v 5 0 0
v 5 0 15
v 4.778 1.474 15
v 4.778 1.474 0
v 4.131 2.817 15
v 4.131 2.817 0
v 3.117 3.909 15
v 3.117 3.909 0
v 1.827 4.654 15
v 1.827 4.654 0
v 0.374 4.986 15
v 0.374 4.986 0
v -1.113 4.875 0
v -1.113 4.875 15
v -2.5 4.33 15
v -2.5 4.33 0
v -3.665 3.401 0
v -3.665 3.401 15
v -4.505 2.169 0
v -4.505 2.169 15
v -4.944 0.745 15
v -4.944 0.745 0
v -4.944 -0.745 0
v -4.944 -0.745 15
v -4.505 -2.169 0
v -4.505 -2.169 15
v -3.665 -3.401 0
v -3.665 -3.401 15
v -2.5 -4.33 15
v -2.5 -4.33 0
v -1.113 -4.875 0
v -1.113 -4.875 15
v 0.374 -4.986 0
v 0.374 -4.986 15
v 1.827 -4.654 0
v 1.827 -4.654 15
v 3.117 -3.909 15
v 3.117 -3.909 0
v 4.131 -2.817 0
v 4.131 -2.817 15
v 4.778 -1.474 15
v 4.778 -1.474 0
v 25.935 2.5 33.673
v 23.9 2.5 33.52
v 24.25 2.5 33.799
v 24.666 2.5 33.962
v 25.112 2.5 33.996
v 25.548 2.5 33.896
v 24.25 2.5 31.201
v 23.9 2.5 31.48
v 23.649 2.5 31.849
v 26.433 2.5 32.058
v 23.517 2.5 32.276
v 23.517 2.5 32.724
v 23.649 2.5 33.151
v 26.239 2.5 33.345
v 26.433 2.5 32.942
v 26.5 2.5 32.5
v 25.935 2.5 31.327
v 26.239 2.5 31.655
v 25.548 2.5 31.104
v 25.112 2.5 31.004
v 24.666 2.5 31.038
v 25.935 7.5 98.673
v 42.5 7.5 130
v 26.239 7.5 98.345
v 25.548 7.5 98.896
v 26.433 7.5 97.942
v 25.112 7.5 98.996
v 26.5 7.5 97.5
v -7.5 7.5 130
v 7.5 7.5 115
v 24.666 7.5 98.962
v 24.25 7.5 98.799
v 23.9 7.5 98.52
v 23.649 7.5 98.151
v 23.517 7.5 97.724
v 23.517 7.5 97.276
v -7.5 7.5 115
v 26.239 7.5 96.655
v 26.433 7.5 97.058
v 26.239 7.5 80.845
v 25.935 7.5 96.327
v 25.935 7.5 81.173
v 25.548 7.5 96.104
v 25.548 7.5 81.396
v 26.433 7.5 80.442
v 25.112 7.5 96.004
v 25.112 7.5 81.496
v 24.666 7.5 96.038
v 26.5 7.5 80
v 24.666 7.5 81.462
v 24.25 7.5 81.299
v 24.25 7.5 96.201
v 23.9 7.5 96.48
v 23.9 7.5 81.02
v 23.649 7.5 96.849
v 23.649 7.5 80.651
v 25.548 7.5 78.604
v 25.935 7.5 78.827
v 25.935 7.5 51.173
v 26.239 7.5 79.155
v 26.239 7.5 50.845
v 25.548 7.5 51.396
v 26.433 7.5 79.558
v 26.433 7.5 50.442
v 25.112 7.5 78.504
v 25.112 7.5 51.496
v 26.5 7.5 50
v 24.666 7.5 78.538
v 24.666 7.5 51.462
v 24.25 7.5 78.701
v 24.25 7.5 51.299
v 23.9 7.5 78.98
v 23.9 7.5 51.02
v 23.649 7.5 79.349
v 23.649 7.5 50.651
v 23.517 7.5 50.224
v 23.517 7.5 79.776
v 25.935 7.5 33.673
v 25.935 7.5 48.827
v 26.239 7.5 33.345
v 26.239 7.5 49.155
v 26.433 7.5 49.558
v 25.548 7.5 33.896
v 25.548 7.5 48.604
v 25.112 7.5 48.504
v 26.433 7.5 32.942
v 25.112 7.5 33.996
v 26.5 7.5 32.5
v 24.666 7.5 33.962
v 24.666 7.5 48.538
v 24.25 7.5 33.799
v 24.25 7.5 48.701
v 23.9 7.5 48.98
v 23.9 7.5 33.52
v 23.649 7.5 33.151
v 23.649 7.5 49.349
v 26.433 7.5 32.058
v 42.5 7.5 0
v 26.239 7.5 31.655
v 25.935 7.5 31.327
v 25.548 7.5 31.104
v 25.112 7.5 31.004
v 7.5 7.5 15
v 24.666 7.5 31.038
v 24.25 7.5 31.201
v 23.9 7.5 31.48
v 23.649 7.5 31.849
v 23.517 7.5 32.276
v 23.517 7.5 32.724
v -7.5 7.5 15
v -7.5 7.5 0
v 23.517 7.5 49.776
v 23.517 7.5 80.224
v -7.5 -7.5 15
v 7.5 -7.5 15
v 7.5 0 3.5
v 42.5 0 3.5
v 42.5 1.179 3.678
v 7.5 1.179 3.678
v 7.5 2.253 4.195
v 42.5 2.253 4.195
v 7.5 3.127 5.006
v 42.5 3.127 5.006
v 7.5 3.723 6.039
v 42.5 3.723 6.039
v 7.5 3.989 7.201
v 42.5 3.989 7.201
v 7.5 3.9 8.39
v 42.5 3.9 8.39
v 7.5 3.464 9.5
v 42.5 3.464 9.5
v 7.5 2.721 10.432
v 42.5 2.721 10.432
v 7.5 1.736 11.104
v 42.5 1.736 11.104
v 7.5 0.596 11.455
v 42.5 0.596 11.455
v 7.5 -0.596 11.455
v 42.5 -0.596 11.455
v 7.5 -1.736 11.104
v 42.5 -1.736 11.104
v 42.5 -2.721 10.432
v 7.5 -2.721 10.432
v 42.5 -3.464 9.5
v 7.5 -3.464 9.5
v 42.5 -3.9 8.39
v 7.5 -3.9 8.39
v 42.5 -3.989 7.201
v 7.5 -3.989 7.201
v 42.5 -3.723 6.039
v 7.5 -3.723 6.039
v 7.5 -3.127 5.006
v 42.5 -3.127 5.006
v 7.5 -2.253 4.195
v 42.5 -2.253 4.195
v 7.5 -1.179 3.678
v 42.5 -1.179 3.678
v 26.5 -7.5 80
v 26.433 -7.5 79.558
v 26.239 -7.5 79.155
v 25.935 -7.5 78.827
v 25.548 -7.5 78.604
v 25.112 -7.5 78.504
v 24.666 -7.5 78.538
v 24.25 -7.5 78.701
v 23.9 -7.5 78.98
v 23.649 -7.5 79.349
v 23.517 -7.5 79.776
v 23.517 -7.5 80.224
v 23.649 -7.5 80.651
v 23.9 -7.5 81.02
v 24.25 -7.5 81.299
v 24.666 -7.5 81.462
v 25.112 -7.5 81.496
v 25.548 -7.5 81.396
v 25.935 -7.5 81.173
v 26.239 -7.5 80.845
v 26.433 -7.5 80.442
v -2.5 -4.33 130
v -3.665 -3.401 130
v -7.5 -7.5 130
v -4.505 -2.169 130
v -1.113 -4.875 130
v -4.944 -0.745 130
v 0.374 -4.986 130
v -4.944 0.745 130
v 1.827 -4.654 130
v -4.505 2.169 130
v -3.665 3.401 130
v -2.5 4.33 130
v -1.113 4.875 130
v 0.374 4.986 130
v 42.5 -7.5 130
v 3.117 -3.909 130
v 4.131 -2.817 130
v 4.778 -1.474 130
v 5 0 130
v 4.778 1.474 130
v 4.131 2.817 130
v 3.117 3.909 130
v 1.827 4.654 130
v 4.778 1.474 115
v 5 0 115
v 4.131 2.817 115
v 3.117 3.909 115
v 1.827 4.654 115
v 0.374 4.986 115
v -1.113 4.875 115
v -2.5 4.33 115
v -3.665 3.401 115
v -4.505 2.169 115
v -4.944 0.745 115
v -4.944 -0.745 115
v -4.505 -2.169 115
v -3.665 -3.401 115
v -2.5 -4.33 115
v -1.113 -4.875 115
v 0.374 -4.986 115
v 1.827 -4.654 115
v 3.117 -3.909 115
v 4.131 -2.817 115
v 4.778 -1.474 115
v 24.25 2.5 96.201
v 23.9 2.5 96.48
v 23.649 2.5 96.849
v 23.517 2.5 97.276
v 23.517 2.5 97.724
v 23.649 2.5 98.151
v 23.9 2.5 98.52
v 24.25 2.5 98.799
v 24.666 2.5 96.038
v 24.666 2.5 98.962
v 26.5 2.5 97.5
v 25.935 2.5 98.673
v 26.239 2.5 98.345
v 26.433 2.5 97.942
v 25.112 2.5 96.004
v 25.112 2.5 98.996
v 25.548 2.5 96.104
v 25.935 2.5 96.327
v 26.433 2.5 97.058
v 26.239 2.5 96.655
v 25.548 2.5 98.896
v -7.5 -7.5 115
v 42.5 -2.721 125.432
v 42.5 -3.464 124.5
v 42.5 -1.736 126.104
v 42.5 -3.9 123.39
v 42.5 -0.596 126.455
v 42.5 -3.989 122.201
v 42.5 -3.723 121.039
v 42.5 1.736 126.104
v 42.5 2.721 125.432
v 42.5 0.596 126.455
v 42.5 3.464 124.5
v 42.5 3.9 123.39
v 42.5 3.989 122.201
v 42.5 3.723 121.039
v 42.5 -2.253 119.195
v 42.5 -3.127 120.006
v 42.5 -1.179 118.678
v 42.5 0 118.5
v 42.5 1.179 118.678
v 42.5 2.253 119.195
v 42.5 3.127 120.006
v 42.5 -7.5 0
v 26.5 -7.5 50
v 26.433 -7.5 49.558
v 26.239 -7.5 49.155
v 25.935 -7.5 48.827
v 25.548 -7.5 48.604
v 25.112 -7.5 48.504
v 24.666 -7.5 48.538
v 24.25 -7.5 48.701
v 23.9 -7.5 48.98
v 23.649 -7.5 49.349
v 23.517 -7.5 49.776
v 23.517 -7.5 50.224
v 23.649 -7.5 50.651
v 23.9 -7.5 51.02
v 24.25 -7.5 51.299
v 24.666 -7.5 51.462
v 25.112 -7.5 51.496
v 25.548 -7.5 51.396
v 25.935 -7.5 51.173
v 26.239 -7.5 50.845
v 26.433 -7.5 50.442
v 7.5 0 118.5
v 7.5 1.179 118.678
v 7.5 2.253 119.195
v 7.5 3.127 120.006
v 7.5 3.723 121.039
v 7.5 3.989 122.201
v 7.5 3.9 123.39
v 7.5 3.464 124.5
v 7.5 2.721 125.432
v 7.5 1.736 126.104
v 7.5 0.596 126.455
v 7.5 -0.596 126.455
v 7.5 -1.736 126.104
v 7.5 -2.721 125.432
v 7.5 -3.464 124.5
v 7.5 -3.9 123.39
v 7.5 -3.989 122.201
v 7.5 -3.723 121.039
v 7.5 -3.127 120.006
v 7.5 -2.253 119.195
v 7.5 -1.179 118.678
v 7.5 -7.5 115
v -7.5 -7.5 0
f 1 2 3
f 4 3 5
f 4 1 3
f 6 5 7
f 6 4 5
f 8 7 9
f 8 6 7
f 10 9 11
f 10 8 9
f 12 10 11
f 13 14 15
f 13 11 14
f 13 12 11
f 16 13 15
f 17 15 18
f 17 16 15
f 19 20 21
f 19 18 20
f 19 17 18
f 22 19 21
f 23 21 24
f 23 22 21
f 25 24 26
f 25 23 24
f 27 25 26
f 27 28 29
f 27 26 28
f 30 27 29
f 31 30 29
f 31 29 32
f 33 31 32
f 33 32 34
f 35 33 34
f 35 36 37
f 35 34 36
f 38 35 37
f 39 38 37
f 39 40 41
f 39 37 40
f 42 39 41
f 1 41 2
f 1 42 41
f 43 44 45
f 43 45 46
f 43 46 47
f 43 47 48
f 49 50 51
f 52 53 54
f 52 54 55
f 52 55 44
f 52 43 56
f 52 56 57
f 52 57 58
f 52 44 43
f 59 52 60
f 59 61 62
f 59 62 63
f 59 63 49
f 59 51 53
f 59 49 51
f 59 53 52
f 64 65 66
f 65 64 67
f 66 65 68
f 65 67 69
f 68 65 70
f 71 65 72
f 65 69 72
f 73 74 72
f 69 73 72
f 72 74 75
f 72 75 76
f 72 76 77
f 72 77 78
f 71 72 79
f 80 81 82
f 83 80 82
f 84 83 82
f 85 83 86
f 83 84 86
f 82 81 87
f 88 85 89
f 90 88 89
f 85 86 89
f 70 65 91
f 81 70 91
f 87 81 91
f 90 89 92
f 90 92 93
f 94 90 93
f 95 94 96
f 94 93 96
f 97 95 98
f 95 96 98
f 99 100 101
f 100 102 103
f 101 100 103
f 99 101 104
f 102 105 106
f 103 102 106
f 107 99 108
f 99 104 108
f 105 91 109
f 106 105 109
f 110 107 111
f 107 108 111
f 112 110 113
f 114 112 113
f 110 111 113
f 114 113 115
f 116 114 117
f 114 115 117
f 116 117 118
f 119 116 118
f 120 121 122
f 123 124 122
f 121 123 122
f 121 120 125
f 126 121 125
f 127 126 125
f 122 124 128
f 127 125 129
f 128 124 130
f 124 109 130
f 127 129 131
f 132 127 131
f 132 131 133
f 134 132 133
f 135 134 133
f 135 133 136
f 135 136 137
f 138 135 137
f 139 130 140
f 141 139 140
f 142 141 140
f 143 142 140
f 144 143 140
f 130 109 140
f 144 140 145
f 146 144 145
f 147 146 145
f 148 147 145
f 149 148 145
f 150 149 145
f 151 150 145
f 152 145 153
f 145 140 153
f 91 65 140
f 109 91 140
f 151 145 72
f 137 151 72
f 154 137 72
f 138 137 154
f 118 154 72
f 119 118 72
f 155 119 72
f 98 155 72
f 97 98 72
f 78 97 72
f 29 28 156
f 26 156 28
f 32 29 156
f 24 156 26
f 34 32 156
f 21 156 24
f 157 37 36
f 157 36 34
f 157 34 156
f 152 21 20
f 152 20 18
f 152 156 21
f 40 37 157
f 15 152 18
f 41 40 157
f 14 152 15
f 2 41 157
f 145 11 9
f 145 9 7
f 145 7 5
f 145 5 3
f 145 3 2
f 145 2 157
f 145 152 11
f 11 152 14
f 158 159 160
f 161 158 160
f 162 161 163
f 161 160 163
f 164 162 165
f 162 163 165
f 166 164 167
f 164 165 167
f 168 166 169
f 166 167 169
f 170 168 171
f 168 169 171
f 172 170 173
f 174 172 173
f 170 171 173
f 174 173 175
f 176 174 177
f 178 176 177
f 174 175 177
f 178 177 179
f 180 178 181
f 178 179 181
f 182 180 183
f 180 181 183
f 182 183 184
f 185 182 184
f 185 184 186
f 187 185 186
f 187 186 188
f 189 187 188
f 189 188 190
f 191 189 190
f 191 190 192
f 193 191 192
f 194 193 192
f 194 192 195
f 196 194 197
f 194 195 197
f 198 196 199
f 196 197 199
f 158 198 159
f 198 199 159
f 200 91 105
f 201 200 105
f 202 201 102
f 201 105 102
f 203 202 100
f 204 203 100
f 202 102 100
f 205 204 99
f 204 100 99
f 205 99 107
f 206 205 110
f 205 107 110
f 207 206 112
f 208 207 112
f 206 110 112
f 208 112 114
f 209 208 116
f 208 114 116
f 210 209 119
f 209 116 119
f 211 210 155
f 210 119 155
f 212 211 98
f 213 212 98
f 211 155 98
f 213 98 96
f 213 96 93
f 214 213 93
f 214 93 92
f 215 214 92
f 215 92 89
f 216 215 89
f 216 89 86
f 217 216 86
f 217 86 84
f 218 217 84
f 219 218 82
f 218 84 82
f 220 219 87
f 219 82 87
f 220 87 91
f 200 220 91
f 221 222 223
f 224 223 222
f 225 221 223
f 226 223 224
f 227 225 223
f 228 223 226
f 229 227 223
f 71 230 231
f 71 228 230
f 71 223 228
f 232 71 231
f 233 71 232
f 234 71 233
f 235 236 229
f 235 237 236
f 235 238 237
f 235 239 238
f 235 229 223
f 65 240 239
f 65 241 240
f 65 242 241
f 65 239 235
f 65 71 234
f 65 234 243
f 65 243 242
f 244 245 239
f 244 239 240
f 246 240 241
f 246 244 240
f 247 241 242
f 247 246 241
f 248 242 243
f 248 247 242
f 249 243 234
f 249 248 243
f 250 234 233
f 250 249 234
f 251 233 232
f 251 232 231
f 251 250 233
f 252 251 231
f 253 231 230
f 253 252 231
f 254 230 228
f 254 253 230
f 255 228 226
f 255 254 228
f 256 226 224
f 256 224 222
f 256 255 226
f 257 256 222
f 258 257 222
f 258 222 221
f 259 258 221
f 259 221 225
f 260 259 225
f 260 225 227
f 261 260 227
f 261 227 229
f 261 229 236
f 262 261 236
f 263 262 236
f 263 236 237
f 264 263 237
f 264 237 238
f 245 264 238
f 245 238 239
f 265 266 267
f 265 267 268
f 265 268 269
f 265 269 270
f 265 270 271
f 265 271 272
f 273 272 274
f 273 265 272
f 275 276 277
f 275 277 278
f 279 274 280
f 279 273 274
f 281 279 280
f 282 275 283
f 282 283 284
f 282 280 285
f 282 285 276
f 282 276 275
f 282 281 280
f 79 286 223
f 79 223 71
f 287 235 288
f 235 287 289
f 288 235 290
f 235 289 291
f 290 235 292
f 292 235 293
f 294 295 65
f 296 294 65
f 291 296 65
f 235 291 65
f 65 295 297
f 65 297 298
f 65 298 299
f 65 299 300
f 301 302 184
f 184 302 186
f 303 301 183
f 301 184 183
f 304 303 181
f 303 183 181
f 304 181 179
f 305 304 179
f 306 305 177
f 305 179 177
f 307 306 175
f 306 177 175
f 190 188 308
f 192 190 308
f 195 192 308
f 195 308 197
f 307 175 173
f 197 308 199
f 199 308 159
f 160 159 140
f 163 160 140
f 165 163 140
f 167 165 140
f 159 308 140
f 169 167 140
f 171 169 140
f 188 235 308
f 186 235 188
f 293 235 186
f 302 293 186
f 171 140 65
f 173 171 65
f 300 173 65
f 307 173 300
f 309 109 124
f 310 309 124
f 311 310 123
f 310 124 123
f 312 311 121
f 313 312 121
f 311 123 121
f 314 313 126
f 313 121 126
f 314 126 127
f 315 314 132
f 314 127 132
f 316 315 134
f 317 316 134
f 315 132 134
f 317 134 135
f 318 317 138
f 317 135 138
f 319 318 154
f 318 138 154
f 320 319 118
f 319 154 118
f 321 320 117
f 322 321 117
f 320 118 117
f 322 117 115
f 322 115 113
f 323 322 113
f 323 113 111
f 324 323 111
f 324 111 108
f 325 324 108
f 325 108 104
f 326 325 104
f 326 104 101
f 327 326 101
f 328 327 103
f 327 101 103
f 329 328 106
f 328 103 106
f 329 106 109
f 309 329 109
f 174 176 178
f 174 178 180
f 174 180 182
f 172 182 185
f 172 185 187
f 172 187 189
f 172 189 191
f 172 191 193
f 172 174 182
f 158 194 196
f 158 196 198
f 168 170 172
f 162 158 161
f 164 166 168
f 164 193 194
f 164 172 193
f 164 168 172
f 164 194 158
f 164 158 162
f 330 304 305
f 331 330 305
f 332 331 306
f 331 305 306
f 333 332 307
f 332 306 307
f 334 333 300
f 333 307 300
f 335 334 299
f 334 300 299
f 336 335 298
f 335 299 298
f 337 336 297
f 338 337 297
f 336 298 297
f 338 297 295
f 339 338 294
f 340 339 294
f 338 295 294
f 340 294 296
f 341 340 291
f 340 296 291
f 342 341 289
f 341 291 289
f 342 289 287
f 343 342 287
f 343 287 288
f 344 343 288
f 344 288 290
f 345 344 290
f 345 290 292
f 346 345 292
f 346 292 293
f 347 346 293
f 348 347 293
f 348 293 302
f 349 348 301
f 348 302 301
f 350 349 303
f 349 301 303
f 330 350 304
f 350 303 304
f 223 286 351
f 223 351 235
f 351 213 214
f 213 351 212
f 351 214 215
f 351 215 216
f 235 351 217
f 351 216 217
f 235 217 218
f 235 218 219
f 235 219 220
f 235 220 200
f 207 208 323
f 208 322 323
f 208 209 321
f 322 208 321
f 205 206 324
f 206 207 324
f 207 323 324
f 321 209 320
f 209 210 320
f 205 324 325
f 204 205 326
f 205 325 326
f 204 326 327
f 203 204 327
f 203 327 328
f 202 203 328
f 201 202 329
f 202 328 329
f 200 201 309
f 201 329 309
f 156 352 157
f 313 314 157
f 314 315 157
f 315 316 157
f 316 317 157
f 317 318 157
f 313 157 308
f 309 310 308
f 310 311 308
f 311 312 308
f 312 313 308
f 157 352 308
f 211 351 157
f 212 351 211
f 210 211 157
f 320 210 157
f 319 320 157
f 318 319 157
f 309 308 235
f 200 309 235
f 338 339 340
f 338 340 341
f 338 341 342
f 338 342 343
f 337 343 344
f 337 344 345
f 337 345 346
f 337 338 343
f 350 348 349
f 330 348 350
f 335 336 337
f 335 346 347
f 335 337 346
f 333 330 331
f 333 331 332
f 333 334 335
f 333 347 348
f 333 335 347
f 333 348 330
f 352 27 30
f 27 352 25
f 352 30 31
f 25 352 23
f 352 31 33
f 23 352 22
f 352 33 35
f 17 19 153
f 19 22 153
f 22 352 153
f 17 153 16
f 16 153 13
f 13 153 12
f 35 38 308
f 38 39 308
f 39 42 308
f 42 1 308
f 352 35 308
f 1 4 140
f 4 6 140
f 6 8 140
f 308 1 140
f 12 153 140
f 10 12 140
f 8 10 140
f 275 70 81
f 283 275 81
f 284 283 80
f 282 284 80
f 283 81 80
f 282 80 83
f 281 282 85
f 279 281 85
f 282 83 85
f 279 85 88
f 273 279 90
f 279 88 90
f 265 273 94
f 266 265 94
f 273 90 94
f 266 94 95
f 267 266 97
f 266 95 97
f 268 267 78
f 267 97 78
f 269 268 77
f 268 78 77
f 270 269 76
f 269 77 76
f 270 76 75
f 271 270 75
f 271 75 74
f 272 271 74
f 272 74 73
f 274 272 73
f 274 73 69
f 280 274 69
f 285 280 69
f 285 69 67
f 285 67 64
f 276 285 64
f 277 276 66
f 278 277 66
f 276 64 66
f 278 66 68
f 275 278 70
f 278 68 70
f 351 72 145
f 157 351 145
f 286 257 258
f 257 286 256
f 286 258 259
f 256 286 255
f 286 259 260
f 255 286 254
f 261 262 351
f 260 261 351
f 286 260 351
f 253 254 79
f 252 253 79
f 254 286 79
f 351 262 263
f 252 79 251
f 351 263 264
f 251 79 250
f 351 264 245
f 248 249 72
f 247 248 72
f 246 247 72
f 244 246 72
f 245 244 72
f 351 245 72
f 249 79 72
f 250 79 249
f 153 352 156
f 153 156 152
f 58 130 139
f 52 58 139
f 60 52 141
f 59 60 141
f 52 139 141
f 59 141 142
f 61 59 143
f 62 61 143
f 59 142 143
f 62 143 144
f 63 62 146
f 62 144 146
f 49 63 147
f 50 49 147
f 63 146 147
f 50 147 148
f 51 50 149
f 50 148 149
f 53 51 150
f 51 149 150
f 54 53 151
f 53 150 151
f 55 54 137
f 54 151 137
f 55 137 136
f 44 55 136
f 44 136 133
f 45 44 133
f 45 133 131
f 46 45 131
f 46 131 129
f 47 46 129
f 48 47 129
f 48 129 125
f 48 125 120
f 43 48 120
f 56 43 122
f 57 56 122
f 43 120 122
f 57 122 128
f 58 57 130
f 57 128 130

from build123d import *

# Parameters (mm, degrees)
ESQUISSE1_W             = 15
ESQUISSE1_H             = 15
ESQUISSE1_R             = 5
ESQUISSE1_W_2           = 35
BOSS_EXTRU_1_DEPTH      = 130
ESQUISSE2_W             = 15
ESQUISSE2_H             = 100
ENL_V_MAT_EXTRU_1_DEPTH = 60
ESQUISSE3_R             = 4
ENL_V_MAT_EXTRU_2_DEPTH = 35
ESQUISSE4_R             = 1.5
ENL_V_MAT_EXTRU_3_DEPTH = 5
ESQUISSE5_R             = 1.5
ENL_V_MAT_EXTRU_4_DEPTH = 15


with BuildPart() as part:
    # Esquisse1 → Boss.-Extru.1 (new body)
    with BuildSketch(Plane.XY):
        Rectangle(ESQUISSE1_W, ESQUISSE1_H)
        Circle(ESQUISSE1_R, mode=Mode.SUBTRACT)
        with Locations((25, 0)):
            Rectangle(ESQUISSE1_W_2, ESQUISSE1_H)
    extrude(amount=BOSS_EXTRU_1_DEPTH)

    # Esquisse2 → Enlèv. mat.-Extru.1 (cut)
    with BuildSketch(Plane(origin=(0, 7.5, 0), x_dir=(1, 0, 0), z_dir=(0, 1, 0))):
        with Locations((0, -65)):
            Rectangle(ESQUISSE2_W, ESQUISSE2_H)
    extrude(amount=-ENL_V_MAT_EXTRU_1_DEPTH, mode=Mode.SUBTRACT)

    # Esquisse3 → Enlèv. mat.-Extru.2 (cut)
    with BuildSketch(Plane(origin=(42.5, 0, 0), x_dir=(0, 0, -1), z_dir=(1, 0, 0))):
        with Locations((-122.5, 0)):
            Circle(ESQUISSE3_R)
        with Locations((-7.5, 0)):
            Circle(ESQUISSE3_R)
    extrude(amount=-ENL_V_MAT_EXTRU_2_DEPTH, mode=Mode.SUBTRACT)

    # Esquisse4 → Enlèv. mat.-Extru.3 (cut)
    with BuildSketch(Plane(origin=(0, 7.5, 0), x_dir=(1, 0, 0), z_dir=(0, 1, 0))):
        with Locations((25, -32.5)):
            Circle(ESQUISSE4_R)
        with Locations((25, -97.5)):
            Circle(ESQUISSE4_R)
    extrude(amount=-ENL_V_MAT_EXTRU_3_DEPTH, mode=Mode.SUBTRACT)

    # Esquisse5 → Enlèv. mat.-Extru.4 (cut)
    with BuildSketch(Plane(origin=(0, 7.5, 0), x_dir=(1, 0, 0), z_dir=(0, 1, 0))):
        with Locations((25, -50)):
            Circle(ESQUISSE5_R)
        with Locations((25, -80)):
            Circle(ESQUISSE5_R)
    extrude(amount=-ENL_V_MAT_EXTRU_4_DEPTH, mode=Mode.SUBTRACT)


solid = part.part
